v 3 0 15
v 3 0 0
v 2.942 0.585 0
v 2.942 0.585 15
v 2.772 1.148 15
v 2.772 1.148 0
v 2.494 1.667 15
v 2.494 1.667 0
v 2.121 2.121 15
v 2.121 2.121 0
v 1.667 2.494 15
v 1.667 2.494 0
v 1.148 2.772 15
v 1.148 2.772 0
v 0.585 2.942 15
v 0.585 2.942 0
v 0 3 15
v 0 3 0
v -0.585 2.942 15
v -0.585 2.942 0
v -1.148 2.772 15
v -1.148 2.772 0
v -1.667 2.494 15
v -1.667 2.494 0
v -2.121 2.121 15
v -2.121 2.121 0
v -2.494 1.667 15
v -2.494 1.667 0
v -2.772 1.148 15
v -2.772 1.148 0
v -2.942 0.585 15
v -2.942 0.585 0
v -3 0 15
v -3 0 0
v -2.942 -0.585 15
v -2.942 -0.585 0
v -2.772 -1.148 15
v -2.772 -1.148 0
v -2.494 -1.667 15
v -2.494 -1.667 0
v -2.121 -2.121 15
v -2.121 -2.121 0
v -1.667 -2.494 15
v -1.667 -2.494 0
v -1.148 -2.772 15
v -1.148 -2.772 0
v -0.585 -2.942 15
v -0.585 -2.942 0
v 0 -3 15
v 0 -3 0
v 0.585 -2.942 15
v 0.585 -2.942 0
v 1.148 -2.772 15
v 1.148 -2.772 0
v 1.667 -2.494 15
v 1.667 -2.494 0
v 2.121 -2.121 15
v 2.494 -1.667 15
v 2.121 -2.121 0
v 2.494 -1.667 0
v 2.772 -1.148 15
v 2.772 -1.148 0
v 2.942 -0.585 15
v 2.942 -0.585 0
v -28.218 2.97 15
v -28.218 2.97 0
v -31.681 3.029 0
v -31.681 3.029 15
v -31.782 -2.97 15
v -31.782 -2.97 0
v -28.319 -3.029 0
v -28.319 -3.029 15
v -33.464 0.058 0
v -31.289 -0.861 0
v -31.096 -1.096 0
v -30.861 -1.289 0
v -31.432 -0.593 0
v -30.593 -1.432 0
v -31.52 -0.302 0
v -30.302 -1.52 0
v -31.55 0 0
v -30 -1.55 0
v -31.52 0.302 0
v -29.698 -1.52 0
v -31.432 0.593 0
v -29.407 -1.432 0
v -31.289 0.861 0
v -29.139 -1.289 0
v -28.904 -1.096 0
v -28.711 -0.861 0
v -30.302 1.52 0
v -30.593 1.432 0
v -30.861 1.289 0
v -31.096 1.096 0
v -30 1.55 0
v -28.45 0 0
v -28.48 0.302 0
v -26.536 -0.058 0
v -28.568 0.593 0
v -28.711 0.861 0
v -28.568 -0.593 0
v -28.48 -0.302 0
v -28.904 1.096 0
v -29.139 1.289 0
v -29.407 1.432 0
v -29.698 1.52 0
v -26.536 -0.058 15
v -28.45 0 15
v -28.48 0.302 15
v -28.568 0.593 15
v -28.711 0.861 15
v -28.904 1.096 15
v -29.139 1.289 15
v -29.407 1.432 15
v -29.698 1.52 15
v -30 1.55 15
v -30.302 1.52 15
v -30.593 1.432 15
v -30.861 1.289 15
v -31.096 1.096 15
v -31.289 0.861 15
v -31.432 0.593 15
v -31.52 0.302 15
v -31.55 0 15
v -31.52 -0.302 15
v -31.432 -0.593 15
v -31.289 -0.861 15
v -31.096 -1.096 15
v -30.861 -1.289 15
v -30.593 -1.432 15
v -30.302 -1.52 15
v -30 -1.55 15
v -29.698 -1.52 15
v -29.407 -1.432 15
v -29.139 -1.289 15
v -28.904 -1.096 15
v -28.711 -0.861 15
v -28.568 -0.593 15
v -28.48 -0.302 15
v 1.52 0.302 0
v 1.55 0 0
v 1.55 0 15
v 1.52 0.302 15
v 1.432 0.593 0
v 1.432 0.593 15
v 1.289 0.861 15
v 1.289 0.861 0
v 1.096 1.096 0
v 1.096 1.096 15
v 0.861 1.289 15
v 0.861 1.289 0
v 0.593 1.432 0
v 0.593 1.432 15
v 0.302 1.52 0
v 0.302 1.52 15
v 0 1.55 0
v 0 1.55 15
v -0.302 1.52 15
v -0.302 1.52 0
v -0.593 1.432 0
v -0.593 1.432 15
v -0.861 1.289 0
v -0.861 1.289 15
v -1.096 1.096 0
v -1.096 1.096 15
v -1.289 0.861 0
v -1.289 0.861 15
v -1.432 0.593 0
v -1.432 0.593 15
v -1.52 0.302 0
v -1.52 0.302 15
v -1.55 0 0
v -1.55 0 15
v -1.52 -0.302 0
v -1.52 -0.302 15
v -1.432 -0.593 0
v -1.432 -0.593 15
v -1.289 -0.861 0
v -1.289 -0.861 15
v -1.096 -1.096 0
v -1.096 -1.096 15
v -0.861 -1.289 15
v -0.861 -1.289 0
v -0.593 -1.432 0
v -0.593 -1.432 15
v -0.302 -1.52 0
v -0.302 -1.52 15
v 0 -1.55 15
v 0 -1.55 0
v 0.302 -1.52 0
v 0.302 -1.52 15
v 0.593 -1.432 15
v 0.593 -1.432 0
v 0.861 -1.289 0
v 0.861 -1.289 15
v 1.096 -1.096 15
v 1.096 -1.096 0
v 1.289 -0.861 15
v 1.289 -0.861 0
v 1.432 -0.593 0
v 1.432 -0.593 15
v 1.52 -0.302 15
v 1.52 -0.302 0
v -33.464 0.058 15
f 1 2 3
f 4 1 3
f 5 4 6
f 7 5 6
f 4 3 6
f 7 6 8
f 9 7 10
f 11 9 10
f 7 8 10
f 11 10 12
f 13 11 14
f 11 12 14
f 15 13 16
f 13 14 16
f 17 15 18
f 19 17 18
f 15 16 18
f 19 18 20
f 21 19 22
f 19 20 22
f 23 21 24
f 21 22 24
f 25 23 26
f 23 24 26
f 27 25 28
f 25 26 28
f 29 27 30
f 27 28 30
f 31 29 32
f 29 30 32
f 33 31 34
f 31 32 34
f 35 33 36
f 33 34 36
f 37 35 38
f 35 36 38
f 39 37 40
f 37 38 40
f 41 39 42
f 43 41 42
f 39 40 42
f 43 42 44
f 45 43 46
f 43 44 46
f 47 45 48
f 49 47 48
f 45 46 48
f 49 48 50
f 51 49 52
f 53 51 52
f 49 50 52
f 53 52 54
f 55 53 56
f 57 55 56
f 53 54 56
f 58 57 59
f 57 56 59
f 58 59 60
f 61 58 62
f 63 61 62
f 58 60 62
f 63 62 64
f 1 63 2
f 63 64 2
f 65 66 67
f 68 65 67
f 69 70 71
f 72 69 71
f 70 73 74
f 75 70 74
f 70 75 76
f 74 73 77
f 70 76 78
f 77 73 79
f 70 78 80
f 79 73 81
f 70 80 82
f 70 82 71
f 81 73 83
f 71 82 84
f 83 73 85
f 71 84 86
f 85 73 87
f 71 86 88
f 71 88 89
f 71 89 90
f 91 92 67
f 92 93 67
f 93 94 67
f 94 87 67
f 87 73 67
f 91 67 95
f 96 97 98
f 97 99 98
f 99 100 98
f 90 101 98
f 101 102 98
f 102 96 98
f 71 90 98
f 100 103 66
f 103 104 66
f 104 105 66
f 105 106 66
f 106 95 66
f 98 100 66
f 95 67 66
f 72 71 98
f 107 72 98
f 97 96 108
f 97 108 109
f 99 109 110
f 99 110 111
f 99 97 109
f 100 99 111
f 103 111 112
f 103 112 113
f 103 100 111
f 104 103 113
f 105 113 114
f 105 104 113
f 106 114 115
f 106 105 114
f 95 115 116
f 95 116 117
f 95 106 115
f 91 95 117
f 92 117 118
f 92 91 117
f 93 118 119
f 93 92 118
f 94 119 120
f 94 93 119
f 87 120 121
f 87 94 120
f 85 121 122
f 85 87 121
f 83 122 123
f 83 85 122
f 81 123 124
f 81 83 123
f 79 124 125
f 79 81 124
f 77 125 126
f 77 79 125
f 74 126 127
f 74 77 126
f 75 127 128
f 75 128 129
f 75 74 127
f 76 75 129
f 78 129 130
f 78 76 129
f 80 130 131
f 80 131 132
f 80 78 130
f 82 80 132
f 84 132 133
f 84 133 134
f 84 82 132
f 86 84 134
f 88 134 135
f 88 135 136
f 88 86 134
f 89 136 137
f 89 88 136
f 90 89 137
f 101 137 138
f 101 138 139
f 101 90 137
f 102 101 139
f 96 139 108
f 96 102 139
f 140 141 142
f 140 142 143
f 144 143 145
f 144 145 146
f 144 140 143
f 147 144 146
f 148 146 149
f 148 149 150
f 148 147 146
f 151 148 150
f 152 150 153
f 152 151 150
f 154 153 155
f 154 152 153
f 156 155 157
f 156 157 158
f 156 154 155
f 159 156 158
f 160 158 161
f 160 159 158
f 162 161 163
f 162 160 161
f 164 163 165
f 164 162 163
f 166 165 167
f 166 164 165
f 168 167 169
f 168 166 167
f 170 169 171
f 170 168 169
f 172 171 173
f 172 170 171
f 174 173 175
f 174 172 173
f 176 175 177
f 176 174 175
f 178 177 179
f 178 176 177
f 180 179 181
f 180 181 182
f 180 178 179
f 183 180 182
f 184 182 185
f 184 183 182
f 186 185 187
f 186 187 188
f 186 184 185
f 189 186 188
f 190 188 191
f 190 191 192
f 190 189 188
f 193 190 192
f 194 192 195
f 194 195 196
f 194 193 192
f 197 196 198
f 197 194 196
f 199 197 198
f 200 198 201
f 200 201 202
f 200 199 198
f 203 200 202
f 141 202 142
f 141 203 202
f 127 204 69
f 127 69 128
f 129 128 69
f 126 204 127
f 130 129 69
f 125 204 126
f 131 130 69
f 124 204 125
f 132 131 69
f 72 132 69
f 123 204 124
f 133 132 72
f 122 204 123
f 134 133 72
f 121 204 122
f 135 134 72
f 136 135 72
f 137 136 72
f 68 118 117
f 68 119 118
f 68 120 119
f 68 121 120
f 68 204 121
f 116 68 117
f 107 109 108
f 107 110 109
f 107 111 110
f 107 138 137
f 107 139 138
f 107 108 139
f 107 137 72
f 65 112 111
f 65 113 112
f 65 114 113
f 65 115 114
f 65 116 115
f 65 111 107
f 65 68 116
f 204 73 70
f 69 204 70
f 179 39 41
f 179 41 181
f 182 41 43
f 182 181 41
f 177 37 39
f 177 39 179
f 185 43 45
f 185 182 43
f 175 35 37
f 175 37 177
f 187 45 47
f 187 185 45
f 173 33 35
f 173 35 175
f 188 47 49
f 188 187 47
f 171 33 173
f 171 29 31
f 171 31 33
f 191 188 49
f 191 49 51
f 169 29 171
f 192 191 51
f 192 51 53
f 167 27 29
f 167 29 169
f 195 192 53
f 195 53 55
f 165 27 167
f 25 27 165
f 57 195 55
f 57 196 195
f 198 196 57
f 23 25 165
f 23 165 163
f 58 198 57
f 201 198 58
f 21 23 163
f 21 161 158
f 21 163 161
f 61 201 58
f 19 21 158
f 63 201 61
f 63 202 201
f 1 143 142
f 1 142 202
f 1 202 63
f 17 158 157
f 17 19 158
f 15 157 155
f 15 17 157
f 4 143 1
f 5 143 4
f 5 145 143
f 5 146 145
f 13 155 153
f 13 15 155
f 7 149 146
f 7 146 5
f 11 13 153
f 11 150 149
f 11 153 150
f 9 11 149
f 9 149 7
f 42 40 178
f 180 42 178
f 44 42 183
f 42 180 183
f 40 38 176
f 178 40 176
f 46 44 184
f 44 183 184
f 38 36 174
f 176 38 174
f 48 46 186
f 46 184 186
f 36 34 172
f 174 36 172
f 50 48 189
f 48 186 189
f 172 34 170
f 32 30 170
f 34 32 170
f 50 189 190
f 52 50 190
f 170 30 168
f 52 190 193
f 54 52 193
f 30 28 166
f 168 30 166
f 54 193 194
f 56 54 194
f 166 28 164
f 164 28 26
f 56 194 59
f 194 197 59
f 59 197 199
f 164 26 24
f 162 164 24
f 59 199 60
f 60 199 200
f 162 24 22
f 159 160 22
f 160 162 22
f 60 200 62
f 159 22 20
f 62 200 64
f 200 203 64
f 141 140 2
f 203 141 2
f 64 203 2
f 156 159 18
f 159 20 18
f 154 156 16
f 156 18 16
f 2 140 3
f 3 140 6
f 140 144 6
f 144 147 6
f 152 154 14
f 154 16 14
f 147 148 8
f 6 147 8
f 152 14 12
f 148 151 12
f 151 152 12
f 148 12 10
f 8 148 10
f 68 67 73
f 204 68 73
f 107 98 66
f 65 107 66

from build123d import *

# Parameters (mm, degrees)
F0_R     = 3
F0_R_2   = 1.55
F1_DEPTH = 15


with BuildPart() as f1:
    # F0 (on Top) → F1 (new body)
    with BuildSketch(Plane.XY):
        Circle(F0_R)
        Circle(F0_R_2, mode=Mode.SUBTRACT)
        Polygon((-28.318654, -3.028709), (-26.536388, -0.058266), (-28.217734, 2.970442), (-31.681346, 3.028709), (-33.463612, 0.058266), (-31.782266, -2.970442), align=None)
        with Locations((-30, 0)):
            Circle(F0_R_2, mode=Mode.SUBTRACT)
    extrude(amount=F1_DEPTH)


solid = f1.part
